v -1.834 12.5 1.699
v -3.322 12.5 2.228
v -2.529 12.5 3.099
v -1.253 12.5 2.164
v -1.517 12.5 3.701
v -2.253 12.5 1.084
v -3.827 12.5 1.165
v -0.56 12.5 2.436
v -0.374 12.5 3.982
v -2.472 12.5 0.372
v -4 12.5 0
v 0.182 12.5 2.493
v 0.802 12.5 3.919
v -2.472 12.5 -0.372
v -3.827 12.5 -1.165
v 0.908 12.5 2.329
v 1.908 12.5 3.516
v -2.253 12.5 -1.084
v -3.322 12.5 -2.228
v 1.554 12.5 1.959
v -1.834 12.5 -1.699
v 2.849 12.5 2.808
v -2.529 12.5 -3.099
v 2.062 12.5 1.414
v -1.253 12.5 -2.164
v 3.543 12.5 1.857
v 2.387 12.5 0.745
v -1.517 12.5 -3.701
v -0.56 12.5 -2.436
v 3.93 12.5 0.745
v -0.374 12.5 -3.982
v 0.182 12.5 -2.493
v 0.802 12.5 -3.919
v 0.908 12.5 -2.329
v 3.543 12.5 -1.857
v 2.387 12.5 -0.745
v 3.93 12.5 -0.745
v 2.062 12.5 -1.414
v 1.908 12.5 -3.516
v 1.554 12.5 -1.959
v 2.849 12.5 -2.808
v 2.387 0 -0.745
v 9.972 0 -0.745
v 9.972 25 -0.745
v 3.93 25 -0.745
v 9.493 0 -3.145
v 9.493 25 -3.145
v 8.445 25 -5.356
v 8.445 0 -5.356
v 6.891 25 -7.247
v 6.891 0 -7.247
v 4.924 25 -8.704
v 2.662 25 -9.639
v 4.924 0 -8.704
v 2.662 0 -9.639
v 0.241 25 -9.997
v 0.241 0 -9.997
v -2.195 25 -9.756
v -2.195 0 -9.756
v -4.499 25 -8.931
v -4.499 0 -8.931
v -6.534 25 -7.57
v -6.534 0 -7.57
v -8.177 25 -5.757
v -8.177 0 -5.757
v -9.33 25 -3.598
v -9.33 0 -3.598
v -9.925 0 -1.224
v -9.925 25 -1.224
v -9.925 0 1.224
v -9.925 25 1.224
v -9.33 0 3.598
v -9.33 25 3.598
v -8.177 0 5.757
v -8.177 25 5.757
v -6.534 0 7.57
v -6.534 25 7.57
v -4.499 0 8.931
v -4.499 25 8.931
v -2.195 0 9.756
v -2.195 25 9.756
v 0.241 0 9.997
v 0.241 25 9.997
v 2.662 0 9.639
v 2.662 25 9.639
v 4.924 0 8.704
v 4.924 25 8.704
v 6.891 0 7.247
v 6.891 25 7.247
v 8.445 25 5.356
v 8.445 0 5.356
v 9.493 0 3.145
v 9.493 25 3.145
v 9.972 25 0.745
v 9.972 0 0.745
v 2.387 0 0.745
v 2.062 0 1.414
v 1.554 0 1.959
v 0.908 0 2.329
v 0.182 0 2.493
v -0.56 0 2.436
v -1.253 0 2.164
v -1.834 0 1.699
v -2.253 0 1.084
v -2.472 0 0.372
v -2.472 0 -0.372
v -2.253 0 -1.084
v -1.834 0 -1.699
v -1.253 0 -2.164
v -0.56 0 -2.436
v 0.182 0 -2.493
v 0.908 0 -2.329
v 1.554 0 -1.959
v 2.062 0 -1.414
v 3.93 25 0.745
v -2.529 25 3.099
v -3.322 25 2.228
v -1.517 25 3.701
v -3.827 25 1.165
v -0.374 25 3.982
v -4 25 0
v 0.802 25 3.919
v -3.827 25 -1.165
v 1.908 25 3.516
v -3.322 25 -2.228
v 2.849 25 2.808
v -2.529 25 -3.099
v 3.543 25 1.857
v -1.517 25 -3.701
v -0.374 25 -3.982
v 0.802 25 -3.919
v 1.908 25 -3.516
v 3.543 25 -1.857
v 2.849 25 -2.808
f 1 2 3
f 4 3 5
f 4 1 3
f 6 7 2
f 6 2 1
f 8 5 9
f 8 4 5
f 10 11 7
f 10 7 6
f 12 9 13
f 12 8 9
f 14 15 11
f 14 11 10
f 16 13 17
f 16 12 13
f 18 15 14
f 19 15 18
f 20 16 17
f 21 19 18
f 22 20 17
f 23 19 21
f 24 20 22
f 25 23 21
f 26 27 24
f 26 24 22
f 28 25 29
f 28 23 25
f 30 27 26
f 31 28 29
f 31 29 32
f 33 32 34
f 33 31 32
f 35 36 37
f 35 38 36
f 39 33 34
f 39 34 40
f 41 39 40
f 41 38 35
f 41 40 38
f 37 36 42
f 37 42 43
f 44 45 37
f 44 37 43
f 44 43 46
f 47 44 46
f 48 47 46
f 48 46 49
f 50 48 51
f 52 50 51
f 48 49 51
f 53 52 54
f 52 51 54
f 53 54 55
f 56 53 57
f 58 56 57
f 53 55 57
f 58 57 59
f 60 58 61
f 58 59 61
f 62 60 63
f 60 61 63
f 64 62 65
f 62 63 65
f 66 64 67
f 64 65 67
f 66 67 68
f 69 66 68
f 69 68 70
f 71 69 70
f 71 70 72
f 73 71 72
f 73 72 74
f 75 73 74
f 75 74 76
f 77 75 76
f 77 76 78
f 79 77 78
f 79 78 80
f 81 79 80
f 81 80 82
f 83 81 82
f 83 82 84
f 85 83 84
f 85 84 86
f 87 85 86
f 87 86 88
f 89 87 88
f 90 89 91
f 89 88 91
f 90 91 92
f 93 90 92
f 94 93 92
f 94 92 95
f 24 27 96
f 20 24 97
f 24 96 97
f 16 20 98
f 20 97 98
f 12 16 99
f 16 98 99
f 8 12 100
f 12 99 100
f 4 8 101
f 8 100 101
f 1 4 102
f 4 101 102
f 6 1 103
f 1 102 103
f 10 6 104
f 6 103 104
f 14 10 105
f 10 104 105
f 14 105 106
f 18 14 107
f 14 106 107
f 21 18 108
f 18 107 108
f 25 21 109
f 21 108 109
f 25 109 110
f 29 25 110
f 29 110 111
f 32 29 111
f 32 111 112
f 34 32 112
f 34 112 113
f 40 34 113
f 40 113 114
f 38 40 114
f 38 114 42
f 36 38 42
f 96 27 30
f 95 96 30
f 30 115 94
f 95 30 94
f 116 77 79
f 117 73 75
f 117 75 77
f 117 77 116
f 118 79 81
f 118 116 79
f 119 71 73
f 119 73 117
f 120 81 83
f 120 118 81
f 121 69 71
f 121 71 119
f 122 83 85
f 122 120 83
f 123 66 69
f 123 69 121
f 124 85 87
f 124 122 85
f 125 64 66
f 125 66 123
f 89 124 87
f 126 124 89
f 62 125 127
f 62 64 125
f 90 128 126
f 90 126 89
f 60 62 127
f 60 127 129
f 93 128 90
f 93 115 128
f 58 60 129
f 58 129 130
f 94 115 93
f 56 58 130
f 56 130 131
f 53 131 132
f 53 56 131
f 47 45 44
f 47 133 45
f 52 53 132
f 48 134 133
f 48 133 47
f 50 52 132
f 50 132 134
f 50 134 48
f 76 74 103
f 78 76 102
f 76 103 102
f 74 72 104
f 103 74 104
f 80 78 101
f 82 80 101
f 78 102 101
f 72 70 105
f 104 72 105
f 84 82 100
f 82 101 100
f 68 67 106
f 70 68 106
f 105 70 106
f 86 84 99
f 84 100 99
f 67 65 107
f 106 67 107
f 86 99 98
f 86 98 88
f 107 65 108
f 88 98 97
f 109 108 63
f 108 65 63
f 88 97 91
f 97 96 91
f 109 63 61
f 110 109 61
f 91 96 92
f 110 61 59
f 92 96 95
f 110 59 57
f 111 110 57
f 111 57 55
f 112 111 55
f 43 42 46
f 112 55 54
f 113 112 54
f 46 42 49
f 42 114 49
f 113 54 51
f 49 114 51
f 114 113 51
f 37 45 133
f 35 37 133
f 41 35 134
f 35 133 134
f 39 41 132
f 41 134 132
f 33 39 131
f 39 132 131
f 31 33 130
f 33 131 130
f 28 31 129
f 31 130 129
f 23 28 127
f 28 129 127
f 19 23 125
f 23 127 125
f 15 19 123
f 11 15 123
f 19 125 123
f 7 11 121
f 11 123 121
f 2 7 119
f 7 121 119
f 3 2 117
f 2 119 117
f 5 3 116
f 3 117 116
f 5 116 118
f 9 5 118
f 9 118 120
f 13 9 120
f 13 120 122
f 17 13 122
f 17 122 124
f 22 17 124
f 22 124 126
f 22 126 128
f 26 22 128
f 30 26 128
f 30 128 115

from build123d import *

# Parameters (mm, degrees)
ESQUISSE2_R        = 10
BOSS_EXTRU_1_DEPTH = 25
SKETCH1_R          = 4
CUT_EXTRUDE1_DEPTH = 12.5
SKETCH2_R          = 2.5
CUT_EXTRUDE2_DEPTH = 12.5
SKETCH3_W          = 12.434729812
SKETCH3_H          = 1.489032772
CUT_EXTRUDE3_DEPTH = 25


with BuildPart() as part:
    # Esquisse2 → Boss.-Extru.1 (new body)
    with BuildSketch(Plane(origin=(0, 0, 0), x_dir=(1, 0, 0), z_dir=(0, 1, 0))):
        Circle(ESQUISSE2_R)
    extrude(amount=BOSS_EXTRU_1_DEPTH)

    # Sketch1 → Cut-Extrude1 (cut)
    with BuildSketch(Plane(origin=(0, 25, 0), x_dir=(1, 0, 0), z_dir=(0, 1, 0))):
        Circle(SKETCH1_R)
    extrude(amount=-CUT_EXTRUDE1_DEPTH, mode=Mode.SUBTRACT)

    # Sketch2 → Cut-Extrude2 (cut)
    with BuildSketch(Plane.XZ):
        Circle(SKETCH2_R)
    extrude(amount=-CUT_EXTRUDE2_DEPTH, mode=Mode.SUBTRACT)

    # Sketch3 → Cut-Extrude3 (cut)
    with BuildSketch(Plane(origin=(0, 25, 0), x_dir=(1, 0, 0), z_dir=(0, 1, 0))):
        with Locations((6.217364906, 0)):
            Rectangle(SKETCH3_W, SKETCH3_H)
    extrude(amount=-CUT_EXTRUDE3_DEPTH, mode=Mode.SUBTRACT)


solid = part.part
